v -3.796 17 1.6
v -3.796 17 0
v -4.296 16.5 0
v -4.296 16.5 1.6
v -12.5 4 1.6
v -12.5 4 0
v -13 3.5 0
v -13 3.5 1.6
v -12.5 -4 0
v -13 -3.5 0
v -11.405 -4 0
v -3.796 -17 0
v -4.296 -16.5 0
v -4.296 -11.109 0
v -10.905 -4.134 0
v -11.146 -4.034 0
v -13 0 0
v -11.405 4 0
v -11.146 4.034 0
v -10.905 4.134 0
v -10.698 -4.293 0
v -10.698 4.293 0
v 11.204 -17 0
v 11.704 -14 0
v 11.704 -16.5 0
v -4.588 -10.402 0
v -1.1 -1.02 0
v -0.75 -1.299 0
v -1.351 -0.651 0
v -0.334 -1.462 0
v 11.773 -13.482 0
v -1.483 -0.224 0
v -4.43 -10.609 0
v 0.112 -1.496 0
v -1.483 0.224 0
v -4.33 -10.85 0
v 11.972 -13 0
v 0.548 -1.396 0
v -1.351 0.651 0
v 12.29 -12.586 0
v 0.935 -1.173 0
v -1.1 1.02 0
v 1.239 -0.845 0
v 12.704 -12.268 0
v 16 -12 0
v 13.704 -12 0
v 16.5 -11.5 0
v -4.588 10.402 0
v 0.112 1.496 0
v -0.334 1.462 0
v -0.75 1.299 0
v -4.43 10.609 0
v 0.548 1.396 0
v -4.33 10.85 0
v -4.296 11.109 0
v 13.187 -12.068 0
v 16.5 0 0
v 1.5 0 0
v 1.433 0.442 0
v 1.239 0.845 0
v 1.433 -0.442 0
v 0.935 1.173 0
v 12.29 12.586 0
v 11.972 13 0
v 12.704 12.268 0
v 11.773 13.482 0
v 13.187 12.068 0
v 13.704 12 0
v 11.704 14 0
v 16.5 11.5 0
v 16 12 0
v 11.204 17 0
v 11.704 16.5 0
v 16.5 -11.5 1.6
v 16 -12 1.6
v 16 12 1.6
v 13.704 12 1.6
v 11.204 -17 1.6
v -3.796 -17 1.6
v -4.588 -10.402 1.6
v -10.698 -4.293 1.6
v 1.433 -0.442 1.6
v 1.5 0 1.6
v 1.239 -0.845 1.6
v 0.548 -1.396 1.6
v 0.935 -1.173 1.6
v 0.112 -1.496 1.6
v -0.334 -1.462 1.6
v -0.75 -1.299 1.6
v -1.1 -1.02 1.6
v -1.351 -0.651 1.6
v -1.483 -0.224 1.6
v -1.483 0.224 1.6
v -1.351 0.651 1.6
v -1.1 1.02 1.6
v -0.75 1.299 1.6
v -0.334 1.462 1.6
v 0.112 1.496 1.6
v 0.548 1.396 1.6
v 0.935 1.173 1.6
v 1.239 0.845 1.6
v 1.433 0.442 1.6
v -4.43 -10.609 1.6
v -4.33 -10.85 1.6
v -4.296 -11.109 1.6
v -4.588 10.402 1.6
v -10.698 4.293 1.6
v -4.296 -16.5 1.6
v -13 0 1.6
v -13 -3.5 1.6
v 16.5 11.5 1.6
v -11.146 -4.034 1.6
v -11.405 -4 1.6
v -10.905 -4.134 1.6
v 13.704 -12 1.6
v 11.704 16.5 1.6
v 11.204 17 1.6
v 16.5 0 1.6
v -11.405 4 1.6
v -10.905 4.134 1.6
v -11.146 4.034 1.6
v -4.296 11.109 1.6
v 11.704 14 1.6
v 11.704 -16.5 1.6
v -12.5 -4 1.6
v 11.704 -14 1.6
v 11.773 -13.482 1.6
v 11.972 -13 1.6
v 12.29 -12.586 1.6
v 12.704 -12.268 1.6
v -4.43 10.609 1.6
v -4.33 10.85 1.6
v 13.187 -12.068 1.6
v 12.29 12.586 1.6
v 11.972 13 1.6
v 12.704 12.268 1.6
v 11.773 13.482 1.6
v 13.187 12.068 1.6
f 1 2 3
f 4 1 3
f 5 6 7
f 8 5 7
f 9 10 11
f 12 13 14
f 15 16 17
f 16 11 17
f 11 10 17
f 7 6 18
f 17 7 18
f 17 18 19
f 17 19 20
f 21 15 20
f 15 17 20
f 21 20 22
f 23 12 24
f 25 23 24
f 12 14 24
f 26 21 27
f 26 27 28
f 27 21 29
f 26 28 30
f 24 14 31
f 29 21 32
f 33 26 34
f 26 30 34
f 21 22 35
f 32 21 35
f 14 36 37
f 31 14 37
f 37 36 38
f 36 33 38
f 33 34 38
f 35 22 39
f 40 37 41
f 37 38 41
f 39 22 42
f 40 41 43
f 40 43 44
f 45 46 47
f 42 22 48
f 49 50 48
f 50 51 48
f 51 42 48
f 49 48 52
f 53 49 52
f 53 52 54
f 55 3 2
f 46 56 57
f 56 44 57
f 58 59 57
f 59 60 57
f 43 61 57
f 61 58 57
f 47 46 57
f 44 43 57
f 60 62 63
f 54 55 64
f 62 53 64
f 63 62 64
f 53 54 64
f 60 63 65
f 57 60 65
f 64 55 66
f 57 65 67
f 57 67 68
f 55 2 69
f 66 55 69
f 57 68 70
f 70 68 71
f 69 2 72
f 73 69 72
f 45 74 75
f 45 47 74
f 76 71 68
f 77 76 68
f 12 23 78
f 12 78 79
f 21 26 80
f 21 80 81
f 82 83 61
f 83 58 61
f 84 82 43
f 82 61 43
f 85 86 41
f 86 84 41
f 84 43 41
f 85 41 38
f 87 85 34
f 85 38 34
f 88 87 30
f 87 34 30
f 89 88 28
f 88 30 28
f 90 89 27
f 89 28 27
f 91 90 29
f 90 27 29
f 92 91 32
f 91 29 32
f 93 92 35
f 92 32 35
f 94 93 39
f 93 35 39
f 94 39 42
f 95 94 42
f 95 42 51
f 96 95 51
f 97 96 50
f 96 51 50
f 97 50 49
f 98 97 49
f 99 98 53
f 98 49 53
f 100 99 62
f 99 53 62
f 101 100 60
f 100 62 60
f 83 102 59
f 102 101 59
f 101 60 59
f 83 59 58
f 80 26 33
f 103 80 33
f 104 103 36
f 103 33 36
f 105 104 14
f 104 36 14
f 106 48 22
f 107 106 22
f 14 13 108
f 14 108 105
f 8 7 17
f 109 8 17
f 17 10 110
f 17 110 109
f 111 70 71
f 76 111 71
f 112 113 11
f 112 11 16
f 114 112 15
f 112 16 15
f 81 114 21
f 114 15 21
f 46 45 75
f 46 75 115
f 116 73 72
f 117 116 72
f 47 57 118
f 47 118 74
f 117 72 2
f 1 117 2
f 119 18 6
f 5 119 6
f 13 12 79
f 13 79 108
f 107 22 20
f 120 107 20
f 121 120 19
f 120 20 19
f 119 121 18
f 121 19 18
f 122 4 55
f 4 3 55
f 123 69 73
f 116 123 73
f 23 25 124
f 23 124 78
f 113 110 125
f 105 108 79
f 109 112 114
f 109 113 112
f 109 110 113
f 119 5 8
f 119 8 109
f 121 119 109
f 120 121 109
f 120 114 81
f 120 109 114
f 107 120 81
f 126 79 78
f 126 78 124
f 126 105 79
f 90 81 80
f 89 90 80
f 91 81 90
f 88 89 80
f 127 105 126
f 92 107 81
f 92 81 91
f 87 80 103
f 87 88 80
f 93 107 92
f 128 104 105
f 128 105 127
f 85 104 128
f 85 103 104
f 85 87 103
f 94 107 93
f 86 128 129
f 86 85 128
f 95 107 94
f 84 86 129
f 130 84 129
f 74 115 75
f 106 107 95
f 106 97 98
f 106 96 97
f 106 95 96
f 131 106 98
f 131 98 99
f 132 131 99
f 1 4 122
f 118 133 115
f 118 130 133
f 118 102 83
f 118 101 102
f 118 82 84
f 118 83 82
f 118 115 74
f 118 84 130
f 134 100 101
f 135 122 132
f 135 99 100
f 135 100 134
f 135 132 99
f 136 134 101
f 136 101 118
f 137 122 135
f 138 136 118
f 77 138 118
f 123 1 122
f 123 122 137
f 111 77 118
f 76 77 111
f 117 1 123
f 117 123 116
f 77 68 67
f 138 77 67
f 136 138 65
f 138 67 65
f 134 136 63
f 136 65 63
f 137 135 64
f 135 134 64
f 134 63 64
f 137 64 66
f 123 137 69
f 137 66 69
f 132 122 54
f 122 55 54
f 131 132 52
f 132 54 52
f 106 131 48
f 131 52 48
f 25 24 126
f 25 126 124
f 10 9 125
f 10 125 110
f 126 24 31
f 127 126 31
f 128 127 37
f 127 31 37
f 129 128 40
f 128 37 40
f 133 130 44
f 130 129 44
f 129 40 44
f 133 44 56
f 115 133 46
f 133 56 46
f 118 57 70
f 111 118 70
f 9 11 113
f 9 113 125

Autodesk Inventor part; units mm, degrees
ref_plane "YZ Plane" through (0, 0, 0) normal (1, 0, 0) x (0, 1, 0)
ref_plane "XZ Plane" through (0, 0, 0) normal (0, 1, 0) x (-1, 0, 0)
ref_plane "XY Plane" through (0, 0, 0) normal (0, 0, 1) x (1, 0, 0)
sketch "スケッチ1" plane through (0, 0, 0) normal (0, 0, 1) x (1, 0, 0)
  line L0 (16.5, 0) -> (16.5, 11.5)
  line L1 (11.2044, 17) -> (-3.7956, 17)
  line L2 (-3.7956, 17) -> (-4.2956, 16.5)
  line L3 (-4.2956, 16.5) -> (-4.2956, 11.1093)
  arc A0 (-4.5885, 10.4022) -> (-4.2956, 11.1093) centre (-5.2956, 11.1093) ccw
  line L4 (-4.5885, 10.4022) -> (-10.6978, 4.2929)
  arc A1 (-11.4049, 4) -> (-10.6978, 4.2929) centre (-11.4049, 5) ccw
  line L5 (-11.4049, 4) -> (-12.5, 4)
  line L6 (-12.5, 4) -> (-13, 3.5)
  line L7 (-13, 3.5) -> (-13, 0)
  circle A2 centre (0, 0) radius 1.5
  line L8 (16, 12) -> (13.7044, 12)
  line L9 (11.7044, 14) -> (11.7044, 16.5)
  line L10 (16.5, 11.5) -> (16, 12)
  line L11 (11.7044, 16.5) -> (11.2044, 17)
  line L12 (0, 0) -> (16.5, 0) construction
  arc A3 (11.7044, 14) -> (13.7044, 12) centre (13.7044, 14) ccw
  line L13 (11.7044, 17) -> (11.7044, 18.5) construction
  line L14 (0, 0) -> (-13, 0) construction
  line L15 (-13, -2) -> (-13, 2) construction
  line L16 (-10.6978, 4.2929) -> (-5.2974, 9.6932) construction
  line L17 (-4.2956, 17) -> (-4.2956, 11.1093) construction
  line L18 (16.5, 0) -> (16.5, -11.5)
  line L19 (11.2044, -17) -> (-3.7956, -17)
  line L20 (-3.7956, -17) -> (-4.2956, -16.5)
  line L21 (-4.2956, -16.5) -> (-4.2956, -11.1093)
  arc A4 (-4.2956, -11.1093) -> (-4.5885, -10.4022) centre (-5.2956, -11.1093) ccw
  line L22 (-4.5885, -10.4022) -> (-10.6978, -4.2929)
  arc A5 (-10.6978, -4.2929) -> (-11.4049, -4) centre (-11.4049, -5) ccw
  line L23 (-11.4049, -4) -> (-12.5, -4)
  line L24 (-12.5, -4) -> (-13, -3.5)
  line L25 (-13, -3.5) -> (-13, 0)
  line L26 (16, -12) -> (13.7044, -12)
  line L27 (11.7044, -14) -> (11.7044, -16.5)
  line L28 (16.5, -11.5) -> (16, -12)
  line L29 (11.7044, -16.5) -> (11.2044, -17)
  arc A6 (13.7044, -12) -> (11.7044, -14) centre (13.7044, -14) ccw
  dimension "d5" = 0.5
  dimension "d6" = 0.5
  dimension "d7" = 16.5
  dimension "d8" = 2
  dimension "d9" = 12
  dimension "d10" = 17
  dimension "d11" = 0.5
  dimension "d12" = 0.5
  dimension "d14" = 0.5
  dimension "d15" = 0.5
  dimension "d16" = 4
  dimension "d18" = 0.5
  dimension "d19" = 0.5
  dimension "d20" = 1
  dimension "d21" = 3
extrude "押し出し1" add sketch "スケッチ1" along normal blind 1.6
properties part number "force_sensor_pcb"
